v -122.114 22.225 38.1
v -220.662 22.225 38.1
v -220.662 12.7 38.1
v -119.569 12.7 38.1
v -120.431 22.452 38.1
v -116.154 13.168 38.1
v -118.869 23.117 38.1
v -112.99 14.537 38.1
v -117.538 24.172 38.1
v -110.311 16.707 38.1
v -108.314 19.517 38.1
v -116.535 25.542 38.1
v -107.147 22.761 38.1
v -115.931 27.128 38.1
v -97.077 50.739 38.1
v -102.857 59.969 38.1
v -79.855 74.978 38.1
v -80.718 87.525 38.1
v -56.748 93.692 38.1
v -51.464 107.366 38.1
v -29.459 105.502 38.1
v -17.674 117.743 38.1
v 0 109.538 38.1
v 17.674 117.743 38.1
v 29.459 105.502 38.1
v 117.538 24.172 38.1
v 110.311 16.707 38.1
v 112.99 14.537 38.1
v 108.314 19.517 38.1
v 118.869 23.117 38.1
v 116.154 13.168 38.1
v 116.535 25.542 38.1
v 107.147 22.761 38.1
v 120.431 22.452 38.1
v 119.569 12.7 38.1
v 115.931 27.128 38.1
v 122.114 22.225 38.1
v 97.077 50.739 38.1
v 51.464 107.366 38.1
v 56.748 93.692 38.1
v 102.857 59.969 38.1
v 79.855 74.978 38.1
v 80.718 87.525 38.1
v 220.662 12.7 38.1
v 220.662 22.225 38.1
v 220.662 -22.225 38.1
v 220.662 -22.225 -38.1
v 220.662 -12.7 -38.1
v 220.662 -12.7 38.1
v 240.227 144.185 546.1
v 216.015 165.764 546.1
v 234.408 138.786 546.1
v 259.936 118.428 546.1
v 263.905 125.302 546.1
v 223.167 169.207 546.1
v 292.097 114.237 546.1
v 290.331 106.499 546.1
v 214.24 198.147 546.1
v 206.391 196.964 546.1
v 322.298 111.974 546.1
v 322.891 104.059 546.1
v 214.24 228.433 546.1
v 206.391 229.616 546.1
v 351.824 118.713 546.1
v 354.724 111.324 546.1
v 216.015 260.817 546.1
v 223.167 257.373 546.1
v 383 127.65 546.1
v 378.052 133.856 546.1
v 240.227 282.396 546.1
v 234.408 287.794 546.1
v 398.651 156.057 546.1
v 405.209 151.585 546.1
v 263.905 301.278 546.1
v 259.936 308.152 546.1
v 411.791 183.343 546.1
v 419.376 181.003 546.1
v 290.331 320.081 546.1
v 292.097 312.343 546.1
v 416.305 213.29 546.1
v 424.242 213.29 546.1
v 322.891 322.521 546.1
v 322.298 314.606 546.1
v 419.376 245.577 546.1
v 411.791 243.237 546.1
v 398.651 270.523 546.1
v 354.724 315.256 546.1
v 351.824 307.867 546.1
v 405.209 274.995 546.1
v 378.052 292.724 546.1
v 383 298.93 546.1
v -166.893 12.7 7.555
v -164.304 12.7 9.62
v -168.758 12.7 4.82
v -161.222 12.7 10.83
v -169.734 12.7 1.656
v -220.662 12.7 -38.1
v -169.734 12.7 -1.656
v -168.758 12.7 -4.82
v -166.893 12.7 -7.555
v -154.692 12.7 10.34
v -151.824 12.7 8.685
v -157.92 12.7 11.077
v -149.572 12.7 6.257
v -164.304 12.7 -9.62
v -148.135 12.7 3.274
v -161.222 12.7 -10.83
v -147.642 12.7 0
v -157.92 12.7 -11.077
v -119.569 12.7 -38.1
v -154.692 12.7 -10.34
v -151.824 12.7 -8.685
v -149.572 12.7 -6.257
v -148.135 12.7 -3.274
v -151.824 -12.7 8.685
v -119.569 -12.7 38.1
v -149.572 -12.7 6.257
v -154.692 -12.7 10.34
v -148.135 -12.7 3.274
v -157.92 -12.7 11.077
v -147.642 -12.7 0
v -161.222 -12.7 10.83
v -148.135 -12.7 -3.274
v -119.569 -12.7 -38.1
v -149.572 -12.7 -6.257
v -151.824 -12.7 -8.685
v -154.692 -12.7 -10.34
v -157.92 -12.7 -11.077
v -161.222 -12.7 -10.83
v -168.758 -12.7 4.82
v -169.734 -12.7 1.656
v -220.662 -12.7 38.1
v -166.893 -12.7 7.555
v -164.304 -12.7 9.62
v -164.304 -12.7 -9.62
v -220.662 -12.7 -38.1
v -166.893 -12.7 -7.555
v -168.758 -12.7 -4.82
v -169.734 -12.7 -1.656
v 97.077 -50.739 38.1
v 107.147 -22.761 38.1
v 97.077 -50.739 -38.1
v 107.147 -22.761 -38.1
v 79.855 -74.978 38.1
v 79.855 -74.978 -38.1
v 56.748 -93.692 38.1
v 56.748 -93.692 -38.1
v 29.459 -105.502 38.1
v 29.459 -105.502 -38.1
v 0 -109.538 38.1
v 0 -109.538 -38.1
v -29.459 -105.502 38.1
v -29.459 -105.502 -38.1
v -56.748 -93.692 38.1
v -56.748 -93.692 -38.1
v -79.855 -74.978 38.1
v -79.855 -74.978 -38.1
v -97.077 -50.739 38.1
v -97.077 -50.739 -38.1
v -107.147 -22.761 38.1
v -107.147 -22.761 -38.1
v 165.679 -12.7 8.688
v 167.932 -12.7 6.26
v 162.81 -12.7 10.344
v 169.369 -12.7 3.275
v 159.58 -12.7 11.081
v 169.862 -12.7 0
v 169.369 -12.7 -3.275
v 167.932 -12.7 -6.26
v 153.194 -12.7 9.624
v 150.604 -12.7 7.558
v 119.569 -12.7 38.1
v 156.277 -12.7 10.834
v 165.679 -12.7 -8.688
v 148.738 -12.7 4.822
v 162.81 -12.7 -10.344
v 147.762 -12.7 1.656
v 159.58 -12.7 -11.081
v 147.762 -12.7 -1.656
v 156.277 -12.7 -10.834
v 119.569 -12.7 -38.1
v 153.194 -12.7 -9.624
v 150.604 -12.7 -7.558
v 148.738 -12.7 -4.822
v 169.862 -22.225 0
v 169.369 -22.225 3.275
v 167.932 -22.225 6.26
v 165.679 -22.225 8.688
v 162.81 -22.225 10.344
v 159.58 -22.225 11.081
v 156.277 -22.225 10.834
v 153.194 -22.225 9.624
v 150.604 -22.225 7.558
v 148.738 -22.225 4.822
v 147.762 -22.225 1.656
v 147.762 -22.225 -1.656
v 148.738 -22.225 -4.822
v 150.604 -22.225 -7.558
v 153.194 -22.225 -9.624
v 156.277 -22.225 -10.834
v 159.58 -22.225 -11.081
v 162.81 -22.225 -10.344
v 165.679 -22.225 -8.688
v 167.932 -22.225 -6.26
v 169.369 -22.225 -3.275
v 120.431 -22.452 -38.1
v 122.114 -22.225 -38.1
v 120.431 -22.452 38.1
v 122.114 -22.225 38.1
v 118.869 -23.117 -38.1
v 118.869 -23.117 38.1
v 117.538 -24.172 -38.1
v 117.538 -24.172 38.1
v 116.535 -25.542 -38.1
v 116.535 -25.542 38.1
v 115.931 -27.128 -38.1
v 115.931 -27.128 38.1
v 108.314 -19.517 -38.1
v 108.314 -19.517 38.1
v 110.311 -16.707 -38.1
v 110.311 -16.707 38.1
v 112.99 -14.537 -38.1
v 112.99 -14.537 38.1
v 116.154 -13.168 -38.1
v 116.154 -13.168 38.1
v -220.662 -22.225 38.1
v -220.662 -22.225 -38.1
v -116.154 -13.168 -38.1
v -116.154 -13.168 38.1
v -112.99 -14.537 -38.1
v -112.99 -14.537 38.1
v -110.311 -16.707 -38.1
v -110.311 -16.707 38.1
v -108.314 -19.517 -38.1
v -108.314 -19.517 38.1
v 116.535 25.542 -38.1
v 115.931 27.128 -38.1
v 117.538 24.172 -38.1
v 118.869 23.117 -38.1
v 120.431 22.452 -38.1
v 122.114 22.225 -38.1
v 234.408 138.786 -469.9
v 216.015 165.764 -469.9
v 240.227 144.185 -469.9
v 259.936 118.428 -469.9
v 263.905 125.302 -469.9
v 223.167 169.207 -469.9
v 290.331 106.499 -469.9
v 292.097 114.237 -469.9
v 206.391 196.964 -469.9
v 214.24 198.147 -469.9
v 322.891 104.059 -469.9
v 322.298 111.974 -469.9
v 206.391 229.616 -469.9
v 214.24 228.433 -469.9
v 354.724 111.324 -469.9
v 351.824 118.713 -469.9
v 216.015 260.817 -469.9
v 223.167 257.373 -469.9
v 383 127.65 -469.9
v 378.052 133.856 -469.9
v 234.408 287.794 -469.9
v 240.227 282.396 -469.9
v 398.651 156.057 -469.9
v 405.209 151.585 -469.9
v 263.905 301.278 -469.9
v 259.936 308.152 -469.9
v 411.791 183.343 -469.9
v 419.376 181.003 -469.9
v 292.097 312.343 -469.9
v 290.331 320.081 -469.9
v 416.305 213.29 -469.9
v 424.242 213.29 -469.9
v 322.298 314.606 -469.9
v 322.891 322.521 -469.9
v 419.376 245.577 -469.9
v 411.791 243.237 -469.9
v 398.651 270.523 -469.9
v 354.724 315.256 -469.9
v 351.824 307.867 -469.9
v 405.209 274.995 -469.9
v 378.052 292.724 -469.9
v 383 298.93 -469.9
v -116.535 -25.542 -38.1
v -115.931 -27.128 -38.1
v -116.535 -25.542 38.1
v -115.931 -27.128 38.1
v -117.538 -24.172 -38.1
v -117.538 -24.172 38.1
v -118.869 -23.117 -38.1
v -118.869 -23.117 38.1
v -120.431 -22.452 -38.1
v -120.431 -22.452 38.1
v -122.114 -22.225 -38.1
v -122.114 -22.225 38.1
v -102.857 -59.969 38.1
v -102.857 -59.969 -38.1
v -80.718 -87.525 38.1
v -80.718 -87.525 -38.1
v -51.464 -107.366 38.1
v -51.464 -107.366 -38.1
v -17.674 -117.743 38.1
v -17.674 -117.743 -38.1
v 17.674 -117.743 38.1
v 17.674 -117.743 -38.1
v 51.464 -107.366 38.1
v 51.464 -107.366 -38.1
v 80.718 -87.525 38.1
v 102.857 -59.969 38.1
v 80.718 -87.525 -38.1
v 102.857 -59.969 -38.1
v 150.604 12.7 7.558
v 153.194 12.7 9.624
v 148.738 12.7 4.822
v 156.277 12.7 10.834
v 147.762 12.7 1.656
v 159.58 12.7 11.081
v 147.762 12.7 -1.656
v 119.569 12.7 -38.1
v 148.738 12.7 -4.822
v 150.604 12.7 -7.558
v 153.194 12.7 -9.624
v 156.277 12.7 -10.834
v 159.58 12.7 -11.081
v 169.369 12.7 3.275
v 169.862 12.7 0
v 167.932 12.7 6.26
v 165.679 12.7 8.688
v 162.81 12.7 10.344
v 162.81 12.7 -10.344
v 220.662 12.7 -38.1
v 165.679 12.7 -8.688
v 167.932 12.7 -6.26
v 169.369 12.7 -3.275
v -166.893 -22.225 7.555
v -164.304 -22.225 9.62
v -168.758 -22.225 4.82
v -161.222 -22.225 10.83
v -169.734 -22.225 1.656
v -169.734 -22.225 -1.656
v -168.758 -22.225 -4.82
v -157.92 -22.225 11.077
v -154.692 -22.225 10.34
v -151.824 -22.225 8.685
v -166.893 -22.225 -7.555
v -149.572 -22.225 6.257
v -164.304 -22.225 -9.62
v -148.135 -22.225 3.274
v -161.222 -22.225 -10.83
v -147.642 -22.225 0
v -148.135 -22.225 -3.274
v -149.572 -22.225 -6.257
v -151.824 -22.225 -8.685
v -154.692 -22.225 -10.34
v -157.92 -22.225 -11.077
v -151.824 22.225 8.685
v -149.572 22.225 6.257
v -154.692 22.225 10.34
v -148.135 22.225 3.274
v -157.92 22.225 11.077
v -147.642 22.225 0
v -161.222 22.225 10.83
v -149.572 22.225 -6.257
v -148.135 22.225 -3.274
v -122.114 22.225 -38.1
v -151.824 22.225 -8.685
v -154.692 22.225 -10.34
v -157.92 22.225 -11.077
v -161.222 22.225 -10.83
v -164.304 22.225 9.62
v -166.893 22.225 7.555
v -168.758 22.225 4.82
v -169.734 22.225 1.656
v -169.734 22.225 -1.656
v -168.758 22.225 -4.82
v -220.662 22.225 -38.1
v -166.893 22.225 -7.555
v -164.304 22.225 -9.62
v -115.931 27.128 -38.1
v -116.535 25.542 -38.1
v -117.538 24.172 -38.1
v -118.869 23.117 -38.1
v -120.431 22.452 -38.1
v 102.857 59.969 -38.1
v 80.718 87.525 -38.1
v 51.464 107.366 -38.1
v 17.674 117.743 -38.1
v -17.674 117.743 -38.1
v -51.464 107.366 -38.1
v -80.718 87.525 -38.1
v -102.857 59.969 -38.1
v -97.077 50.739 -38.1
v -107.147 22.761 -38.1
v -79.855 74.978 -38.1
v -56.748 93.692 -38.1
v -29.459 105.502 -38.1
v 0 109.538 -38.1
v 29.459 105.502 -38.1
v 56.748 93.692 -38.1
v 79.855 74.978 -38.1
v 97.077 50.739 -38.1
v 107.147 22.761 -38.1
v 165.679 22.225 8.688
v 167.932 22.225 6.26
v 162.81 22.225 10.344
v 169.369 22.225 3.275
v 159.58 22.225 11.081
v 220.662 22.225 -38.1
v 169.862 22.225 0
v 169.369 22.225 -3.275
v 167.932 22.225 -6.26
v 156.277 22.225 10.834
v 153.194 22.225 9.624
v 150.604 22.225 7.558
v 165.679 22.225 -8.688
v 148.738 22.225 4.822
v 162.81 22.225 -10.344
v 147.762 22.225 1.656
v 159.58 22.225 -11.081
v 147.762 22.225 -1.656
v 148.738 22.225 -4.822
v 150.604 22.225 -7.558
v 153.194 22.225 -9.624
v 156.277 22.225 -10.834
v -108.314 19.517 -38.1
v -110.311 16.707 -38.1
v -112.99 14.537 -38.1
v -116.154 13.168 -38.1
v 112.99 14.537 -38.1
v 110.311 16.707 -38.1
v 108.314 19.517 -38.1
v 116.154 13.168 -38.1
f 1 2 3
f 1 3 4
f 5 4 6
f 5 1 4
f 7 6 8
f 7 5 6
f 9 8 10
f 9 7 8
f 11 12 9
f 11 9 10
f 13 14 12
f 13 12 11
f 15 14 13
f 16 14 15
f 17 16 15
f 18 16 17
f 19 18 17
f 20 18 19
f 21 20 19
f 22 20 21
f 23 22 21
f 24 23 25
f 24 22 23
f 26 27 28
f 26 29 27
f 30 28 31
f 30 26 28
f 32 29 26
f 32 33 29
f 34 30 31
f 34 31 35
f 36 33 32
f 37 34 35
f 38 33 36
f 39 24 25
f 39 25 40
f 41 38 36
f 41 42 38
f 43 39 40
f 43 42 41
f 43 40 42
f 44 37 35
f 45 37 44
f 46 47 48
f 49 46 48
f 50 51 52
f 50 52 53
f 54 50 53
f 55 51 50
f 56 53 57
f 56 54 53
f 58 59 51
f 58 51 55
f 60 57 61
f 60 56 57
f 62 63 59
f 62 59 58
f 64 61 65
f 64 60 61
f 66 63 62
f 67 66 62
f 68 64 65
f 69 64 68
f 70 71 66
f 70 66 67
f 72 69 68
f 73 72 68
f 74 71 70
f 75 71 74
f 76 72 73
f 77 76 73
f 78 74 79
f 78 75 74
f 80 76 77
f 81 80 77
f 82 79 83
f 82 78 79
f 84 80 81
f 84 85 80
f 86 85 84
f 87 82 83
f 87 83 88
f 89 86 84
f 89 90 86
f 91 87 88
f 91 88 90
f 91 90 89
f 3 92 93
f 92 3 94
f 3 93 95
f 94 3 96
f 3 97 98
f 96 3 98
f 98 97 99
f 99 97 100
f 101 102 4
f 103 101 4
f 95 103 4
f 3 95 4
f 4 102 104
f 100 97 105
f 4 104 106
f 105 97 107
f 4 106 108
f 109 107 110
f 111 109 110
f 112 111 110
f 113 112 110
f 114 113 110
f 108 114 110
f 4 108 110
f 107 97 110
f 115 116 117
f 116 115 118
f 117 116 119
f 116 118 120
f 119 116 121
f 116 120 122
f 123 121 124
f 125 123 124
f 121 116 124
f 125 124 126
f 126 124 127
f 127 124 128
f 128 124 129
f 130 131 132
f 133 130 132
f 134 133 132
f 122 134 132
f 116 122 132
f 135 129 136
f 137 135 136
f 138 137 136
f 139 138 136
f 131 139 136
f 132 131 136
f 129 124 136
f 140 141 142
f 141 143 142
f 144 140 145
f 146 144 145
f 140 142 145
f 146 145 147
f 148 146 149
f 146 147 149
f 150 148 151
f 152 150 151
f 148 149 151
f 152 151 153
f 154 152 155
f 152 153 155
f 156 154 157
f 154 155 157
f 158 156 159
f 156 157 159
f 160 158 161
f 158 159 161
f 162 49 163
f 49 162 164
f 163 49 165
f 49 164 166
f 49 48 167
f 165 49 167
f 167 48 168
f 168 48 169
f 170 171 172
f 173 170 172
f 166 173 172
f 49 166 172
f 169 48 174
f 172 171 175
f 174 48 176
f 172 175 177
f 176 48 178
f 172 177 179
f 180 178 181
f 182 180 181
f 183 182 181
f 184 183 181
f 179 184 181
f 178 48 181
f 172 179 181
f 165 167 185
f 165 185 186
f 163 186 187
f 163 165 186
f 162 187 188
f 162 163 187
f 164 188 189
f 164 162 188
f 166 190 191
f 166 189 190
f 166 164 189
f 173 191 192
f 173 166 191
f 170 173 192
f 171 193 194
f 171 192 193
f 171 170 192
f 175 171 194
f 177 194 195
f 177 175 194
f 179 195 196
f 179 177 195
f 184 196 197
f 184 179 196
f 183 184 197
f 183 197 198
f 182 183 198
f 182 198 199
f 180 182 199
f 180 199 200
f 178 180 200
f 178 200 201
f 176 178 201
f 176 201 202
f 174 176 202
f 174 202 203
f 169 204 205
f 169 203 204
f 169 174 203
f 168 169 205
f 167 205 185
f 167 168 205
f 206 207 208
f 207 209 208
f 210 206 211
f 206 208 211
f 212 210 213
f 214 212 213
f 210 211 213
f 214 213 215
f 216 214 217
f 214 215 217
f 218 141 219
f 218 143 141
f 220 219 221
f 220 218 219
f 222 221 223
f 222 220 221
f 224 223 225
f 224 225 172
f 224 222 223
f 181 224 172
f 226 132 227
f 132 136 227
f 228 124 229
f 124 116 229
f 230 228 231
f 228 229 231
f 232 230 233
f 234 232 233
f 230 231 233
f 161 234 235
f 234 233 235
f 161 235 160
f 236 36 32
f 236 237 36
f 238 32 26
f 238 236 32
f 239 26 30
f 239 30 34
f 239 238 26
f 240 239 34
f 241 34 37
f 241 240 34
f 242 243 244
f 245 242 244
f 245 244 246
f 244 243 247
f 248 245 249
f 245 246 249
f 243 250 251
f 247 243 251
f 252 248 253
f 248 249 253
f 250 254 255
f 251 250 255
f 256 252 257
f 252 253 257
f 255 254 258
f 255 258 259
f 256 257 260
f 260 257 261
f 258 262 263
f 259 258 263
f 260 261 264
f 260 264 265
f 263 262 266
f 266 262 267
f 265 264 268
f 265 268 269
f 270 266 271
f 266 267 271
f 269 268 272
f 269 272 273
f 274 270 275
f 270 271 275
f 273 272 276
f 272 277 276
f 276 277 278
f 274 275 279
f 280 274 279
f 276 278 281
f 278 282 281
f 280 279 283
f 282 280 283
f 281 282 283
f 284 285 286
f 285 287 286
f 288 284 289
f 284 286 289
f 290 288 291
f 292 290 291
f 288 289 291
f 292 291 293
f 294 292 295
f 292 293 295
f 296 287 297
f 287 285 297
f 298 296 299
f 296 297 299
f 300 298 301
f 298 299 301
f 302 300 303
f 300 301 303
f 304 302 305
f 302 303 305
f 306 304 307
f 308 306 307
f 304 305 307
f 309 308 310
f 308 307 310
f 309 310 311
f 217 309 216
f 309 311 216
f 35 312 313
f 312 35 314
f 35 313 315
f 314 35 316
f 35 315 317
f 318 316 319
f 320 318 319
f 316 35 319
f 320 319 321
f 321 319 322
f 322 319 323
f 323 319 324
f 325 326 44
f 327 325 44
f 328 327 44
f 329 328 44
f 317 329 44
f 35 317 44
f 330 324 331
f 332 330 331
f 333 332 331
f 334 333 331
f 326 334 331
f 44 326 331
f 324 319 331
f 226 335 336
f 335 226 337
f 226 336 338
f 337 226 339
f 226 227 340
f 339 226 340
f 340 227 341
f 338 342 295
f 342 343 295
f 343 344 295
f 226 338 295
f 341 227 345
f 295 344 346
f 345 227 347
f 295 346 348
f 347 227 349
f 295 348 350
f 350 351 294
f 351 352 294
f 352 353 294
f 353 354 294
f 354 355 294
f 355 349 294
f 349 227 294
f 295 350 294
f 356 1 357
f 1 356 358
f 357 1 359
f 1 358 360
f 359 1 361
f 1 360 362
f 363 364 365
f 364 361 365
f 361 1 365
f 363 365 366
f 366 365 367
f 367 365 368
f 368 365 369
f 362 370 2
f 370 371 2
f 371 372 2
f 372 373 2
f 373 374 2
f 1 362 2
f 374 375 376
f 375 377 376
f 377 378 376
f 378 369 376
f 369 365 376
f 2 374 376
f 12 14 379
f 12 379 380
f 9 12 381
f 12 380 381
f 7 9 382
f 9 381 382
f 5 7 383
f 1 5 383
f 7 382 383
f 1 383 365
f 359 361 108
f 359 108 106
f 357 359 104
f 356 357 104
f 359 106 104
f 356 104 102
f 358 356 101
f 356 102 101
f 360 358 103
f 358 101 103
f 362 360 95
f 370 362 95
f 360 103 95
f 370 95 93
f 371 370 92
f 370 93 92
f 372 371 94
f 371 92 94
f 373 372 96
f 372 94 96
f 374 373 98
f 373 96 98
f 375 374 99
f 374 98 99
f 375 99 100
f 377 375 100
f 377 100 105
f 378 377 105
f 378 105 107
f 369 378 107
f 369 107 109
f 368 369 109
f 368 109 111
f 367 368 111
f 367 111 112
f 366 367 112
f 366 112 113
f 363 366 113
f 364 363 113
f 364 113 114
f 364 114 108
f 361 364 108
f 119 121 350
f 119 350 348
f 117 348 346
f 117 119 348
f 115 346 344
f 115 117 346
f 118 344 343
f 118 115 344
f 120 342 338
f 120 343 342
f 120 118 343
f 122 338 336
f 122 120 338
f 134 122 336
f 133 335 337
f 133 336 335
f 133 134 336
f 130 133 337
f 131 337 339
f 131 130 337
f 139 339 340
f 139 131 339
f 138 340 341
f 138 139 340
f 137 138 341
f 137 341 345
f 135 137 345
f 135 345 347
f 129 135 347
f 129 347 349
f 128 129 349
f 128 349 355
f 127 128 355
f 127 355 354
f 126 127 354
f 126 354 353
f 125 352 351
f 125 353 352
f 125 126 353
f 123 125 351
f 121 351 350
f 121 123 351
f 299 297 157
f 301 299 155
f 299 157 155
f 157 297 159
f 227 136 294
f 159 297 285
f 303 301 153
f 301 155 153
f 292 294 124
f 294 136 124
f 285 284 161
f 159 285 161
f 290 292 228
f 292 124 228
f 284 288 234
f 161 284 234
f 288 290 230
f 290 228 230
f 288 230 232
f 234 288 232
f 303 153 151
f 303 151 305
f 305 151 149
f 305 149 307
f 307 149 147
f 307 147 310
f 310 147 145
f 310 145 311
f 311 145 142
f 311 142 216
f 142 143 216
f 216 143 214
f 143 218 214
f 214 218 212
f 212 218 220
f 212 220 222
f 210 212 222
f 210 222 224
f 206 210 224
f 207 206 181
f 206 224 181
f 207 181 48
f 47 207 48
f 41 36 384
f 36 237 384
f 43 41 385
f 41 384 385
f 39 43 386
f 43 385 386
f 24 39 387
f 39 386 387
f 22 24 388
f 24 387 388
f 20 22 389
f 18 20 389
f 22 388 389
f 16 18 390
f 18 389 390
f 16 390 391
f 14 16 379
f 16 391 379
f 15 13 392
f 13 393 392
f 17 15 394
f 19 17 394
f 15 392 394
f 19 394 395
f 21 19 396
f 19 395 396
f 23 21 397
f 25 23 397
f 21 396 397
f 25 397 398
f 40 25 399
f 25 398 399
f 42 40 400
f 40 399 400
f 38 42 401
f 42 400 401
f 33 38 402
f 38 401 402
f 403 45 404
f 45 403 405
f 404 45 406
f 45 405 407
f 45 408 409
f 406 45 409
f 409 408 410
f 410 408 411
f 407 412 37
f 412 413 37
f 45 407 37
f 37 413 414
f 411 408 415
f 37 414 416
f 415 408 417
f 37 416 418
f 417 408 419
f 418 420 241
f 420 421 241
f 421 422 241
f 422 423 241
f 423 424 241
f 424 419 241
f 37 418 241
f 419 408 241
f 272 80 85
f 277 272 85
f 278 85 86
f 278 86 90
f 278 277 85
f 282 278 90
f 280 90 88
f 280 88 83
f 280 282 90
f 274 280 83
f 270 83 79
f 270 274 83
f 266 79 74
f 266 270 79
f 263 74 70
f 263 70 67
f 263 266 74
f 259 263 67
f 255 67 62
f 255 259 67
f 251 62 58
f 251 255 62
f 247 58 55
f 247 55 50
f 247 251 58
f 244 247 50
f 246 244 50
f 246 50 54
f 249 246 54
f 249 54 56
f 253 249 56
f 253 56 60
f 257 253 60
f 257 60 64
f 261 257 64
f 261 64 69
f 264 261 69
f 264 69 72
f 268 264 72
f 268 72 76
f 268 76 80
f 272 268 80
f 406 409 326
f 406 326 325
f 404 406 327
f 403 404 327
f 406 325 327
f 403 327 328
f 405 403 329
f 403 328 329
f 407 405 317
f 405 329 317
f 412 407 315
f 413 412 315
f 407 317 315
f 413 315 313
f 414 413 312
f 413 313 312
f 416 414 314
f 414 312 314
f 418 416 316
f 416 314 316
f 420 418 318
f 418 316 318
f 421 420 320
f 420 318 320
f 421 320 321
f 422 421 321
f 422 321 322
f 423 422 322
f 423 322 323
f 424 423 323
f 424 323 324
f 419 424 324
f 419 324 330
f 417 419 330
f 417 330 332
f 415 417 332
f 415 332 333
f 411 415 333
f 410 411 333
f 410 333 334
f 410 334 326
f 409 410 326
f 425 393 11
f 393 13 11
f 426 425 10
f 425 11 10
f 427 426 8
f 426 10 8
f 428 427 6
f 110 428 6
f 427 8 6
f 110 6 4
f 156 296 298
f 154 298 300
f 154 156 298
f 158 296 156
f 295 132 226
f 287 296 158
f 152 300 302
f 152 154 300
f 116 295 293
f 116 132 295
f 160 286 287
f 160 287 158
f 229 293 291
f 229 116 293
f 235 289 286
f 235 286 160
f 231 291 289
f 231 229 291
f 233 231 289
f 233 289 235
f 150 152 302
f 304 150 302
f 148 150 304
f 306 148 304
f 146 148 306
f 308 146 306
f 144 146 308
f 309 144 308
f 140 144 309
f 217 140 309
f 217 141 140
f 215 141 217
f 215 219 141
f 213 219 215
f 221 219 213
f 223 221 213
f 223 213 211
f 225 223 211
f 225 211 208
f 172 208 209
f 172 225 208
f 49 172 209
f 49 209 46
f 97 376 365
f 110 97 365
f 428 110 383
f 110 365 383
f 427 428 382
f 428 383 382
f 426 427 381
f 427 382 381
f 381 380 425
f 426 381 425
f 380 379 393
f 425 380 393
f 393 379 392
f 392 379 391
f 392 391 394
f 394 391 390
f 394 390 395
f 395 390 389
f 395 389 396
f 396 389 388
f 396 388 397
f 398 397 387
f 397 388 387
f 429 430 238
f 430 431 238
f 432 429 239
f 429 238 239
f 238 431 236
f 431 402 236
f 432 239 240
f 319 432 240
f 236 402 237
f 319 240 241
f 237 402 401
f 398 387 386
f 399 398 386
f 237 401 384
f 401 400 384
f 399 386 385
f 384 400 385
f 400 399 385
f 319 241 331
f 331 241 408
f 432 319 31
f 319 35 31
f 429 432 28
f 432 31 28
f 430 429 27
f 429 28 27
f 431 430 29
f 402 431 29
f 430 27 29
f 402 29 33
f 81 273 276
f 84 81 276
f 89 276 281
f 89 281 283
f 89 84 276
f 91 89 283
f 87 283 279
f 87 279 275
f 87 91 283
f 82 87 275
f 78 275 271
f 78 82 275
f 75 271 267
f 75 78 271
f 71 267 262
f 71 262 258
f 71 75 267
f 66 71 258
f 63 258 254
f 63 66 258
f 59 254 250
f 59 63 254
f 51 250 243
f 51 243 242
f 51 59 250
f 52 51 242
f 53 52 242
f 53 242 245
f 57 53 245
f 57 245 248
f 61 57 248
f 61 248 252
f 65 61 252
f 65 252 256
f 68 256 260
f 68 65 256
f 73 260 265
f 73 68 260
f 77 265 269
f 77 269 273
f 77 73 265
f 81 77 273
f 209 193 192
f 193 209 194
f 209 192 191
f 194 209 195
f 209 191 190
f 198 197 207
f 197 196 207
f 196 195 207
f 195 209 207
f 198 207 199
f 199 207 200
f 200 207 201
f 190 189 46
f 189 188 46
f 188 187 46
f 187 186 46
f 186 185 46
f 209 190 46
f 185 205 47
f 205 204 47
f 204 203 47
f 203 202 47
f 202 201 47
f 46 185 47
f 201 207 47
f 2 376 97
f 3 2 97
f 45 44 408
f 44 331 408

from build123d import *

# Parameters (mm, degrees)
F0_R        = 109.5375
F0_R_2      = 101.6
F1_DEPTH    = 38.1
F2_R        = 6.35
F3_R        = 12.7
F4_R        = 11.108204
F4_R_2      = 11.1125
F5_DEPTH    = 119.0635
F6_DEPTH    = 322.828566
F1_FACE_R   = 109.5375
F1_FACE_R_2 = 101.6
F7_DEPTH    = 508


with BuildPart() as f1:
    # F0 (on Top) → F1 (new body, symmetric)
    with BuildSketch(Plane.XY):
        with BuildLine():
            ThreePointArc((108.798777, -12.7), (0, -109.5375), (-108.798777, -12.7))
            Line((-108.798777, -12.7), (-220.6625, -12.7))
            Line((-220.6625, -12.7), (-220.6625, -22.225))
            Line((-220.6625, -22.225), (-116.969775, -22.225))
            ThreePointArc((-116.969775, -22.225), (0, -119.0625), (116.969775, -22.225))
            Line((116.969775, -22.225), (220.6625, -22.225))
            Line((220.6625, -22.225), (220.6625, -12.7))
            Line((220.6625, -12.7), (108.798777, -12.7))
        make_face()
        with BuildLine():
            Line((-220.6625, 22.225), (-220.6625, 12.7))
            Line((-220.6625, 12.7), (-108.798777, 12.7))
            ThreePointArc((-108.798777, 12.7), (0, 109.5375), (108.798777, 12.7))
            Line((108.798777, 12.7), (220.6625, 12.7))
            Line((220.6625, 12.7), (220.6625, 22.225))
            Line((220.6625, 22.225), (116.969775, 22.225))
            ThreePointArc((116.969775, 22.225), (0, 119.0625), (-116.969775, 22.225))
            Line((-116.969775, 22.225), (-220.6625, 22.225))
        make_face()
        with Locations((314.704984, 213.290066)):
            Circle(F0_R)
        with Locations((314.704984, 213.290066)):
            Circle(F0_R_2, mode=Mode.SUBTRACT)
    extrude(amount=F1_DEPTH, both=True)

    # F2
    f2_edges = [f1.edges().sort_by_distance(p)[0] for p in [
        (-116.969775, 22.225, 0),
        (116.969775, 22.225, 0),
        (116.969775, -22.225, 0),
        (-116.969775, -22.225, 0),
    ]]
    fillet(f2_edges, radius=F2_R)

    # F3
    f3_edges = [f1.edges().sort_by_distance(p)[0] for p in [
        (-108.798777, 12.7, 0),
        (108.798777, 12.7, 0),
        (108.798777, -12.7, 0),
        (-108.798777, -12.7, 0),
    ]]
    fillet(f3_edges, radius=F3_R)

    # F4 (on Front) → F5 (cut, through all)
    with BuildSketch(Plane.XZ):
        with Locations((-158.75, 0)):
            Circle(F4_R)
        with Locations((158.75, 0)):
            Circle(F4_R_2)
    extrude(amount=F5_DEPTH, mode=Mode.SUBTRACT)

    # F4 (on Front) → F6 (cut, through all)
    with BuildSketch(Plane.XZ):
        with Locations((-158.75, 0)):
            Circle(F4_R)
        with Locations((158.75, 0)):
            Circle(F4_R_2)
    extrude(amount=-F6_DEPTH, mode=Mode.SUBTRACT)

    # F1_face (on face) → F7 (join, symmetric)
    with BuildSketch(Plane(origin=(314.704984, 213.290066, 38.1), x_dir=(1, 0, 0), z_dir=(0, 0, 1))):
        Circle(F1_FACE_R)
        Circle(F1_FACE_R_2, mode=Mode.SUBTRACT)
    extrude(amount=F7_DEPTH, both=True)


solid = f1.part
